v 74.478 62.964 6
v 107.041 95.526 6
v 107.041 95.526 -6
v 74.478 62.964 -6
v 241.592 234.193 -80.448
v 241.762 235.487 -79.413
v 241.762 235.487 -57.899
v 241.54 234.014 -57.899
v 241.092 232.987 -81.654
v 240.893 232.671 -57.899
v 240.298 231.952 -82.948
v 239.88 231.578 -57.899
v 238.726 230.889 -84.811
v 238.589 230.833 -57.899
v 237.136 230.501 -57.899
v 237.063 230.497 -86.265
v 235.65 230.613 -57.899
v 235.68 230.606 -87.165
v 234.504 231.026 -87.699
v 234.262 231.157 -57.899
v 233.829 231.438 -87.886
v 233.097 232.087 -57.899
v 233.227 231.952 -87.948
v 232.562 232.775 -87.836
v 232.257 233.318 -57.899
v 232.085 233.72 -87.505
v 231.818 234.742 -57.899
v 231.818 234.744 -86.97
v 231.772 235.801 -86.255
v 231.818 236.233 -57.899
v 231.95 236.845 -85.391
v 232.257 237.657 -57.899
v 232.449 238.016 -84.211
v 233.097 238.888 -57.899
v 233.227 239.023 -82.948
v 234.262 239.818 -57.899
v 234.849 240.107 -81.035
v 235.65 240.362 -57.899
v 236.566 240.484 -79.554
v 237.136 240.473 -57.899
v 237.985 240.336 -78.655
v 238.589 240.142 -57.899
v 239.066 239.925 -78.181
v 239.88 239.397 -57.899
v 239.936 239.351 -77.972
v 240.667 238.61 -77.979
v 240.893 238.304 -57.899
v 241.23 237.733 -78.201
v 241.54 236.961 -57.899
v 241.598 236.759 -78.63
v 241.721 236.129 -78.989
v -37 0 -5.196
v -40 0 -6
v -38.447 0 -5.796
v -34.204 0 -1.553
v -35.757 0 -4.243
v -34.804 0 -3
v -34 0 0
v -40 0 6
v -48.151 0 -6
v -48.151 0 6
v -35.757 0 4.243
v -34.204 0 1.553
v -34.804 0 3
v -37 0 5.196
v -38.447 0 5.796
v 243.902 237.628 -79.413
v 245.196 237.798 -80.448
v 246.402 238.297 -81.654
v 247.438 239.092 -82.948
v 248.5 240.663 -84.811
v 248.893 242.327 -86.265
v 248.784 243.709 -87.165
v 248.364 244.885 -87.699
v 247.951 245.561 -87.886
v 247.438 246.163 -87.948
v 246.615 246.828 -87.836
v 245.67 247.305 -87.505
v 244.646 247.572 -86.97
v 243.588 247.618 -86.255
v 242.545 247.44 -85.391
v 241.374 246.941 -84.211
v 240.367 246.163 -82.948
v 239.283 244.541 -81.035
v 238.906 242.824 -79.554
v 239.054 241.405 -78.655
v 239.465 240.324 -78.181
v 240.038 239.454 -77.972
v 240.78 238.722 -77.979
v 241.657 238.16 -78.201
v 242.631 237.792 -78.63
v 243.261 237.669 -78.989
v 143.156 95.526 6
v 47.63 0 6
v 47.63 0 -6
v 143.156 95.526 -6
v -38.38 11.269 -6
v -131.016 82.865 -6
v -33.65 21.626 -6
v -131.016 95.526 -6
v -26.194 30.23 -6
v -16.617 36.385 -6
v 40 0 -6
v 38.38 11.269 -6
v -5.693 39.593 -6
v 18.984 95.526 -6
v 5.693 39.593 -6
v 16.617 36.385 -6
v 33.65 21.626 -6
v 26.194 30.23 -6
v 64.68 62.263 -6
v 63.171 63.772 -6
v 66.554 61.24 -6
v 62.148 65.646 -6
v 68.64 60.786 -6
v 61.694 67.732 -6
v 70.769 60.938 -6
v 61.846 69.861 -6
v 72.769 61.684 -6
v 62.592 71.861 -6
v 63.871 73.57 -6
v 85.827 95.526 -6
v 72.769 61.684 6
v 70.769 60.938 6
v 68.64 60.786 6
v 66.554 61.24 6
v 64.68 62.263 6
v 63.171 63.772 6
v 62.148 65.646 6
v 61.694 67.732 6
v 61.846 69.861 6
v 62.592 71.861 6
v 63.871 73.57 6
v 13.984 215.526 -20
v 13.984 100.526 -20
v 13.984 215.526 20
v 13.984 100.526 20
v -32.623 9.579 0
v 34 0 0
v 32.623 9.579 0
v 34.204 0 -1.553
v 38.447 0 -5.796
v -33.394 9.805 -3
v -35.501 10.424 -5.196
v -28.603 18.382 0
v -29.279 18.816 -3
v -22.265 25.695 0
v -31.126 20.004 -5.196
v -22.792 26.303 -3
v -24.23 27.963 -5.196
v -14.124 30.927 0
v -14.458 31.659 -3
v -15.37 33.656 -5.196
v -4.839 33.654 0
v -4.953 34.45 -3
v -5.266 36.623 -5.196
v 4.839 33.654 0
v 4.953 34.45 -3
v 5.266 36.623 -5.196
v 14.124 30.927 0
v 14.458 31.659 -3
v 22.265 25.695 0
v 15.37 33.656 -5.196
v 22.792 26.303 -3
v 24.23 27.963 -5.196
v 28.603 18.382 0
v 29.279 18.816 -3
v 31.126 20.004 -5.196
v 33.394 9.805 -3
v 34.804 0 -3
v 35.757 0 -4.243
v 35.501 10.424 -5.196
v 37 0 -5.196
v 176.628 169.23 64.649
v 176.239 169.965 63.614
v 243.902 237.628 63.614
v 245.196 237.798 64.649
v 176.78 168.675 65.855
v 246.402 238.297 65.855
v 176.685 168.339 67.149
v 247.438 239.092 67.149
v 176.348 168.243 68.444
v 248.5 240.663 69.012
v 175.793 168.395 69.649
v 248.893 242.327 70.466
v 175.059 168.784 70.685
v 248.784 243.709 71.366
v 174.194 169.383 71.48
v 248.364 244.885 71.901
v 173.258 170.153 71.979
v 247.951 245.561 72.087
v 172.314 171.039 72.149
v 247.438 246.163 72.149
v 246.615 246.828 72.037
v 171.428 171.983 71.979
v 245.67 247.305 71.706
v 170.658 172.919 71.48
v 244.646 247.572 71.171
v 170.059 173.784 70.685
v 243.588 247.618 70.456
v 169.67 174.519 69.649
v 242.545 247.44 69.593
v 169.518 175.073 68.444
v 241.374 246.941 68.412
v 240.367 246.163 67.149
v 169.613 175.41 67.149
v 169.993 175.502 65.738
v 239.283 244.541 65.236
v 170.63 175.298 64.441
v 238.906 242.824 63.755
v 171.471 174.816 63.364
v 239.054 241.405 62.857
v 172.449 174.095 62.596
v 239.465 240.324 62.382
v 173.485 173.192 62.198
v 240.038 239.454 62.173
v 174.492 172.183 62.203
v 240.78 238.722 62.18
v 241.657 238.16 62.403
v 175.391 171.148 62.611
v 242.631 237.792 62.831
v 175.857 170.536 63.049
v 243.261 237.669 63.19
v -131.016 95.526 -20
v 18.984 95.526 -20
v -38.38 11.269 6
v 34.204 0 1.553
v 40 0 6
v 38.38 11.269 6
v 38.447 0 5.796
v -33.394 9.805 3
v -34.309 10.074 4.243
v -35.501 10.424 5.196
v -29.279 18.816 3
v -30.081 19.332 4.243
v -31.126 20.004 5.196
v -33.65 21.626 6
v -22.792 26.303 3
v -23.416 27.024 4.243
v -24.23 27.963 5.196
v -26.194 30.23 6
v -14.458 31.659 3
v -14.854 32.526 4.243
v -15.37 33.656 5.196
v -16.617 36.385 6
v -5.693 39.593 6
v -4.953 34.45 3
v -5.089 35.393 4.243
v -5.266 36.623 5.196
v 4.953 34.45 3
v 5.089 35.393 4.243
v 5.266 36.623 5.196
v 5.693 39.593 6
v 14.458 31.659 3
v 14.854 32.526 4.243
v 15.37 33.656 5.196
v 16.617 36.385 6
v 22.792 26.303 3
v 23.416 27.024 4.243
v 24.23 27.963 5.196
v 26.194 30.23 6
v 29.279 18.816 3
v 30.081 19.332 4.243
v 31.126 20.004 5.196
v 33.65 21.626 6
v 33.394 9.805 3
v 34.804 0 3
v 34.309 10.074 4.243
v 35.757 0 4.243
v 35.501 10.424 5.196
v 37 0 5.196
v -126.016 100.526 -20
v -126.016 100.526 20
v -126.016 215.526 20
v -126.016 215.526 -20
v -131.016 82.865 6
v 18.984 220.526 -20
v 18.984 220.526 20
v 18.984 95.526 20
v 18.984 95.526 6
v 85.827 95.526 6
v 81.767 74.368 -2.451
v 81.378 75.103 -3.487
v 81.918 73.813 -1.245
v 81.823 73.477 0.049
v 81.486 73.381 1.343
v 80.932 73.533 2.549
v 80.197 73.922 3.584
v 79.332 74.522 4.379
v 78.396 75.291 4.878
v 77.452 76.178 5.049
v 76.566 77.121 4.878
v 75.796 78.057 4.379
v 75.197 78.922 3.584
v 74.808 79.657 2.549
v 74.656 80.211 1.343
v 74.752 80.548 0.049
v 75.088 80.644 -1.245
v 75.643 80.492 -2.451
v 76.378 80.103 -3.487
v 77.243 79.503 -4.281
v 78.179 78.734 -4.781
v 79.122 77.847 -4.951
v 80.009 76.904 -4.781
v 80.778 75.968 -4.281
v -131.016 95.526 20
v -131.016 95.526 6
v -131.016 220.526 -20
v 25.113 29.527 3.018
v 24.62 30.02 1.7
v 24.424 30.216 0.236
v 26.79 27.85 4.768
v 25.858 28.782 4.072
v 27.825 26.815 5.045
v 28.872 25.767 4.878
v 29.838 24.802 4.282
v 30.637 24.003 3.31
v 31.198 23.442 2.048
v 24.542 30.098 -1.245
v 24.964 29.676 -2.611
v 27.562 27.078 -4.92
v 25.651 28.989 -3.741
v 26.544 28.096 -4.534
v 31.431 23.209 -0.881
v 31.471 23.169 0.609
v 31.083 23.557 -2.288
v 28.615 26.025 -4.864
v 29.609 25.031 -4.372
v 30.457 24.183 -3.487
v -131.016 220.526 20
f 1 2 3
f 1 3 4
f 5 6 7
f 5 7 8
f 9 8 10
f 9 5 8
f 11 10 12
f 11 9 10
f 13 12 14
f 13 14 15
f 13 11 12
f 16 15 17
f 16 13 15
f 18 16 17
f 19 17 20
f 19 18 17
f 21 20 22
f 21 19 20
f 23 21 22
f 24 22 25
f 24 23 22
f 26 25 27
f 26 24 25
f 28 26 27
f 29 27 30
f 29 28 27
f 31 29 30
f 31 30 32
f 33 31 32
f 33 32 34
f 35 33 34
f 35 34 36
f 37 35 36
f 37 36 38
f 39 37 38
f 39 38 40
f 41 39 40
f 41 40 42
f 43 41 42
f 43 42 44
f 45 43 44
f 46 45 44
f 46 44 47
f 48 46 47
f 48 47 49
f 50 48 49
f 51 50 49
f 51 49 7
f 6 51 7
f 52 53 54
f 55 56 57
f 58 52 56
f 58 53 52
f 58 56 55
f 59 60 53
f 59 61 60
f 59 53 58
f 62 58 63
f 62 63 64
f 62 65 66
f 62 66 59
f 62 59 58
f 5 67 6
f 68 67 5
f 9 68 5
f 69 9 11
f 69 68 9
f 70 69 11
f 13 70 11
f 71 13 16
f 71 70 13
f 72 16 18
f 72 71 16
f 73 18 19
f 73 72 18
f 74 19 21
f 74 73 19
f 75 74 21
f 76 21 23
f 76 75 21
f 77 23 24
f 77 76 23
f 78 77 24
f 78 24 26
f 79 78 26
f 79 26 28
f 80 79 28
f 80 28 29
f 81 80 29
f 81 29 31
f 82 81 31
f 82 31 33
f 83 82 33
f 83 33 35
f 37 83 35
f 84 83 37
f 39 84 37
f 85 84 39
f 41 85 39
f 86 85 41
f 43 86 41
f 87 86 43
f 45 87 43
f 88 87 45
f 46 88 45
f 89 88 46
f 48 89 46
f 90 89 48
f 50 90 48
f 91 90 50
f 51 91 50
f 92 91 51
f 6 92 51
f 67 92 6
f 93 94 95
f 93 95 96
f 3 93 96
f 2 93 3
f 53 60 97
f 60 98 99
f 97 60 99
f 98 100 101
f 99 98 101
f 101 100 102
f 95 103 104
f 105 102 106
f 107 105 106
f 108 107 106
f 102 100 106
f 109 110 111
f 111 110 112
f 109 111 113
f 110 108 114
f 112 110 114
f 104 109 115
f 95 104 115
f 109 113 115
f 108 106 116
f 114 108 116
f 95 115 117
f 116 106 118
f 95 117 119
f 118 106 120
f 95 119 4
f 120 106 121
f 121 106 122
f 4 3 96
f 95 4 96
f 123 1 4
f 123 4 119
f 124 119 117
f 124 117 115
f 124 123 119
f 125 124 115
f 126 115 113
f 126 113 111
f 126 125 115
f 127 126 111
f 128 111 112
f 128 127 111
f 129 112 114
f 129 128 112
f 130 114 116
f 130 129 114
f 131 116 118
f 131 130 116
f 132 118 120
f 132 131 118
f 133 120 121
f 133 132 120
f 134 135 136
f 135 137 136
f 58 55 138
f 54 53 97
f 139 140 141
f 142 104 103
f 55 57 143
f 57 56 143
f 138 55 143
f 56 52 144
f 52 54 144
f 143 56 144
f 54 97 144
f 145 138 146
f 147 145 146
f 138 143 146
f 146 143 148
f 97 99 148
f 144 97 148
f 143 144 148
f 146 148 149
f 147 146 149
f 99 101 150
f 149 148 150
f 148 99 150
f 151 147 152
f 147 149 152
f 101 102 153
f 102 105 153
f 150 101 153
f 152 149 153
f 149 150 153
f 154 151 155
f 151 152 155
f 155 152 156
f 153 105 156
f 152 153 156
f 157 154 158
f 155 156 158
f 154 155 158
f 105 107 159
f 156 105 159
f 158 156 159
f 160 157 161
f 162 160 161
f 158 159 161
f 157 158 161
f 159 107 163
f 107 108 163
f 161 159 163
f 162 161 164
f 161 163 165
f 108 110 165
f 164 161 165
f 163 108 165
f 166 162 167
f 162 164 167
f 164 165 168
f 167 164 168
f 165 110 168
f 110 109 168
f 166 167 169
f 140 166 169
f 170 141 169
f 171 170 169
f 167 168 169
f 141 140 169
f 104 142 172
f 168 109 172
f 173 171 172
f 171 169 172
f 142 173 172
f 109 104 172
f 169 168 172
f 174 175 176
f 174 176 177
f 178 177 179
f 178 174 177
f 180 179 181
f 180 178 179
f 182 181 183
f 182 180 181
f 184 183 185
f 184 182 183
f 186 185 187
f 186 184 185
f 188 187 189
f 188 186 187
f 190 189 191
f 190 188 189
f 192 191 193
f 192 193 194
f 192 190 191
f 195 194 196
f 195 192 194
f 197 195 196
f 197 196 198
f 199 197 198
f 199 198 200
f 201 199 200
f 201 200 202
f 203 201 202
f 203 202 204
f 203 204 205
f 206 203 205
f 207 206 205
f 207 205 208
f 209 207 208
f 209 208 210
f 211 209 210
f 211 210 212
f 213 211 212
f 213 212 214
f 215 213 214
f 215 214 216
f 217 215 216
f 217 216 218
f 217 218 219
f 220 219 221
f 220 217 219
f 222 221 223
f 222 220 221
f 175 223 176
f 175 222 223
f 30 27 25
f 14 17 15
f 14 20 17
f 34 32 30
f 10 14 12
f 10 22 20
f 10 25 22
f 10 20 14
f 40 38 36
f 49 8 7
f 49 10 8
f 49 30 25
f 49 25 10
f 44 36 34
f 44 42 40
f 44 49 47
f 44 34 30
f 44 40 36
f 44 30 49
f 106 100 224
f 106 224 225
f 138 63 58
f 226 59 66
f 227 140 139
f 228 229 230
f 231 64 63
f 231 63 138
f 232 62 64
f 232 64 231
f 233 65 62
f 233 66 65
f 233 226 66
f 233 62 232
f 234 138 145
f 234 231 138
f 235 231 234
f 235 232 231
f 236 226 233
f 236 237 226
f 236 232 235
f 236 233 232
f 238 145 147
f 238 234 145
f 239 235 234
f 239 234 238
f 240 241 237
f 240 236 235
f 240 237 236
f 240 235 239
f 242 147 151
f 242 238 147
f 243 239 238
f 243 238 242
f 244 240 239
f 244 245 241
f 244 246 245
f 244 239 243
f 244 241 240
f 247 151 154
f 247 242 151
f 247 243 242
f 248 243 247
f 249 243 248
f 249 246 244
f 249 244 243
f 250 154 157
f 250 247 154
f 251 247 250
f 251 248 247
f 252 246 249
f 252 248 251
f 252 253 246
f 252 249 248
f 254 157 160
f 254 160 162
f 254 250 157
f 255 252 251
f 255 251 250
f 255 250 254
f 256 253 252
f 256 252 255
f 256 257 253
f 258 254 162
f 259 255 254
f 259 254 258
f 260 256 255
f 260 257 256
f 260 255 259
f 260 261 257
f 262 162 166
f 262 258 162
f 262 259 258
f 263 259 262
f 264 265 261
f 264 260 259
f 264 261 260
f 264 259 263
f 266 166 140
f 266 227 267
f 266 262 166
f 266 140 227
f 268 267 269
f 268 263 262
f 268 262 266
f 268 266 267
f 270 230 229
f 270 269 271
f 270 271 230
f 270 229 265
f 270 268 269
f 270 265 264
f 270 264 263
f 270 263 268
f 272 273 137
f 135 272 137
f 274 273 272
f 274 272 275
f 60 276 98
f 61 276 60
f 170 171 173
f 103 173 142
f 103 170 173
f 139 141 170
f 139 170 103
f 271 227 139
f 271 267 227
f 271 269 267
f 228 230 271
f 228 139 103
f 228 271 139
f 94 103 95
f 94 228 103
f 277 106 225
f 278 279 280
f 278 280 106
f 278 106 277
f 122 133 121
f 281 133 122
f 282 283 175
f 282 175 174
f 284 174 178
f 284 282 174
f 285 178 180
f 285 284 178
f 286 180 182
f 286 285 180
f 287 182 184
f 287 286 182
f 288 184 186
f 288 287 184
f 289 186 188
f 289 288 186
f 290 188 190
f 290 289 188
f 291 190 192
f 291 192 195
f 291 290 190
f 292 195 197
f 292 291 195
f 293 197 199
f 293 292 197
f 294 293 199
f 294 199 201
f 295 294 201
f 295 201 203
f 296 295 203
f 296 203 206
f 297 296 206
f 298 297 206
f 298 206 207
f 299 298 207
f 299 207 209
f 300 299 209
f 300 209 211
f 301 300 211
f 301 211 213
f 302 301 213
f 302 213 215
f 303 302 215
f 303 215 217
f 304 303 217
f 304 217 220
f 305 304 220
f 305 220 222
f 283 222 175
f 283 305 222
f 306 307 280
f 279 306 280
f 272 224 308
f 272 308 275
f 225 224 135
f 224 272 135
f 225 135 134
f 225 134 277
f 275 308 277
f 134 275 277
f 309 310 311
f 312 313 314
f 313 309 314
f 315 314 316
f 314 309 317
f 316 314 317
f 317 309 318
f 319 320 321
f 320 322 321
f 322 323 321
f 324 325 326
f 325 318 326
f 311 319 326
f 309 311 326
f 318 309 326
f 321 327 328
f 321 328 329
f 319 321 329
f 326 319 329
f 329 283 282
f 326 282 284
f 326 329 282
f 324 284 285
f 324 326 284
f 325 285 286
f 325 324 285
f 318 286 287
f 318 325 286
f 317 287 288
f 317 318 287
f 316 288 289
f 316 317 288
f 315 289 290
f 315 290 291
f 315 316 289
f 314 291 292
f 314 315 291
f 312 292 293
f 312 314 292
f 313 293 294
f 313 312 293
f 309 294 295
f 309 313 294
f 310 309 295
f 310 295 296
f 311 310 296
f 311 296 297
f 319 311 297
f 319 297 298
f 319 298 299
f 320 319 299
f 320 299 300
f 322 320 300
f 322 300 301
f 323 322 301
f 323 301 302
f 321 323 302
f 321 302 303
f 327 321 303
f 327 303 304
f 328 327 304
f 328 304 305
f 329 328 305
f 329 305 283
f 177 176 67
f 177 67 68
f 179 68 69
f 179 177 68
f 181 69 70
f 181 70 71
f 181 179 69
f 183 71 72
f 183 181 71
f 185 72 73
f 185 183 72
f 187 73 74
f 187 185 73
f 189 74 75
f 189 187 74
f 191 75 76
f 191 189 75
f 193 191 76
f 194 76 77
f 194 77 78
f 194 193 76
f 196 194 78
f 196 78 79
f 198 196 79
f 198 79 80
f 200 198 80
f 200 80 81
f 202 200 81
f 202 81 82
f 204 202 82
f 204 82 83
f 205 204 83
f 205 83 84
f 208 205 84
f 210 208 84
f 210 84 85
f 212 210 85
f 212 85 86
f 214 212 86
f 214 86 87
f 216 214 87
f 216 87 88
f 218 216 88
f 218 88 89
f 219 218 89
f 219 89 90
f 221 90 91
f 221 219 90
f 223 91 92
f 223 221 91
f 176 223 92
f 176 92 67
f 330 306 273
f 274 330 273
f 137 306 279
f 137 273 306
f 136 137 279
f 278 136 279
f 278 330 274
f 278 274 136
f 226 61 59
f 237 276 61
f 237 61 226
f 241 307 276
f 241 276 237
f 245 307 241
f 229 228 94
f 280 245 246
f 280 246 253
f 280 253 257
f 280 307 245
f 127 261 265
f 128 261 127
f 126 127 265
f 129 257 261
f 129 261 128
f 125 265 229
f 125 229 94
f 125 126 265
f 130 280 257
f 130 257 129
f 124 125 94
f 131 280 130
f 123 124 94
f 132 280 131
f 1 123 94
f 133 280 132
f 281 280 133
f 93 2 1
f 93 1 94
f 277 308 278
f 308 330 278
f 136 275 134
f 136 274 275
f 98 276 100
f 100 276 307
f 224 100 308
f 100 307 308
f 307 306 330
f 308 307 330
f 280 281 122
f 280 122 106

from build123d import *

# Parameters (mm, degrees)
F3_DEPTH      = 6
F3_DEPTH_BACK = 6
F4_R          = 5.99999
F5_W          = 150
F5_H          = 125
F5_W_2        = 140
F5_H_2        = 115
F6_DEPTH      = 20
F6_DEPTH_BACK = 20
F7_W          = 18.4257775545
F7_H          = 22.6281583309
F8_DEPTH      = 25
F8_DEPTH_BACK = 25
F12_R         = 5


# Not quite as in the source:
# - a fillet or chamfer is up to 0.001 mm smaller than in the source, because OpenCascade refuses the exact size
# - the program builds the solid bodies; features that only make, move or delete a surface that nothing else refers to are left out


with BuildPart() as f3:
    # F2 (on Top) → F3 (new body, two sides)
    with BuildSketch(Plane.XY) as f3_sk:
        with BuildLine():
            Line((-143.6767325086, 95.5261040182), (-48.1506284904, 0))
            Line((-48.1506284904, 0), (-34, 0))
            ThreePointArc((-34, 0), (0, 34), (34, 0))
            Line((34, 0), (47.630082774, 0))
            Line((47.630082774, 0), (143.1561867922, 95.5261040182))
            Line((143.1561867922, 95.5261040182), (107.040643459, 95.5261040182))
            Line((107.040643459, 95.5261040182), (74.4780500334, 62.9635105926))
            ThreePointArc((74.4780500334, 62.9635105926), (63.8714483156, 62.9635105926), (63.8714483156, 73.5701123104))
            Line((63.8714483156, 73.5701123104), (85.8274400234, 95.5261040182))
            Line((85.8274400234, 95.5261040182), (-143.6767325086, 95.5261040182))
        make_face()
    extrude(amount=F3_DEPTH)
    extrude(f3_sk.sketch, amount=-F3_DEPTH_BACK)

    # F4 (radius 6 in the source; OpenCascade refuses exactly that, so slightly less here)
    f4_edges = [f3.edges().sort_by_distance(p)[0] for p in [
        (0, 34, 6),
        (0, 34, -6),
    ]]
    fillet(f4_edges, radius=F4_R)

    # F5 (on Top) → F6 (join, two sides)
    with BuildSketch(Plane.XY) as f6_sk:
        with Locations((-56.0159248962, 158.0261040182)):
            Rectangle(F5_W, F5_H)
        with Locations((-56.0159248962, 158.0261040182)):
            Rectangle(F5_W_2, F5_H_2, mode=Mode.SUBTRACT)
    extrude(amount=F6_DEPTH)
    extrude(f6_sk.sketch, amount=-F6_DEPTH_BACK)

    # F7 (on Top) → F8 (cut, two sides)
    with BuildSketch(Plane.XY) as f8_sk:
        with Locations((-140.2288136734, 86.2188637257)):
            Rectangle(F7_W, F7_H)
    extrude(amount=F8_DEPTH, mode=Mode.SUBTRACT)
    extrude(f8_sk.sketch, amount=-F8_DEPTH_BACK, mode=Mode.SUBTRACT)


with BuildPart() as f13:
    # F13: sweep along a path in F10
    with BuildLine(Plane(origin=(0.4539688615, -0.4539688615, 0), x_dir=(0.7071067812, 0.7071067812, 0), z_dir=(0.7071067812, -0.7071067812, 0))) as f13_path:
        Line((333.9798068309, -57.8993414214), (333.9798068309, -82.8993414214))
        Line((333.9798068309, -82.8993414214), (343.9798068309, -82.8993414214))
        Line((343.9798068309, -82.8993414214), (343.9798068309, 67.1006585786))
        Line((343.9798068309, 67.1006585786), (243.9798068309, 67.1006585786))
        Line((243.9798068309, 67.1006585786), (109.8250394228, 0))
        Line((109.8250394228, 0), (88.6497050524, 0))
        Line((88.6497050524, 0), (38.6362485588, 0))
    # F12 (on plane+point) → F13 (sweep)
    with BuildSketch(Plane.XY.offset(-57.8993414214)):
        with Locations((236.7622852325, 235.4874759912)):
            Circle(F12_R)
    sweep(path=f13_path.line, transition=Transition.RIGHT)


solid = Compound([f3.part, f13.part])
